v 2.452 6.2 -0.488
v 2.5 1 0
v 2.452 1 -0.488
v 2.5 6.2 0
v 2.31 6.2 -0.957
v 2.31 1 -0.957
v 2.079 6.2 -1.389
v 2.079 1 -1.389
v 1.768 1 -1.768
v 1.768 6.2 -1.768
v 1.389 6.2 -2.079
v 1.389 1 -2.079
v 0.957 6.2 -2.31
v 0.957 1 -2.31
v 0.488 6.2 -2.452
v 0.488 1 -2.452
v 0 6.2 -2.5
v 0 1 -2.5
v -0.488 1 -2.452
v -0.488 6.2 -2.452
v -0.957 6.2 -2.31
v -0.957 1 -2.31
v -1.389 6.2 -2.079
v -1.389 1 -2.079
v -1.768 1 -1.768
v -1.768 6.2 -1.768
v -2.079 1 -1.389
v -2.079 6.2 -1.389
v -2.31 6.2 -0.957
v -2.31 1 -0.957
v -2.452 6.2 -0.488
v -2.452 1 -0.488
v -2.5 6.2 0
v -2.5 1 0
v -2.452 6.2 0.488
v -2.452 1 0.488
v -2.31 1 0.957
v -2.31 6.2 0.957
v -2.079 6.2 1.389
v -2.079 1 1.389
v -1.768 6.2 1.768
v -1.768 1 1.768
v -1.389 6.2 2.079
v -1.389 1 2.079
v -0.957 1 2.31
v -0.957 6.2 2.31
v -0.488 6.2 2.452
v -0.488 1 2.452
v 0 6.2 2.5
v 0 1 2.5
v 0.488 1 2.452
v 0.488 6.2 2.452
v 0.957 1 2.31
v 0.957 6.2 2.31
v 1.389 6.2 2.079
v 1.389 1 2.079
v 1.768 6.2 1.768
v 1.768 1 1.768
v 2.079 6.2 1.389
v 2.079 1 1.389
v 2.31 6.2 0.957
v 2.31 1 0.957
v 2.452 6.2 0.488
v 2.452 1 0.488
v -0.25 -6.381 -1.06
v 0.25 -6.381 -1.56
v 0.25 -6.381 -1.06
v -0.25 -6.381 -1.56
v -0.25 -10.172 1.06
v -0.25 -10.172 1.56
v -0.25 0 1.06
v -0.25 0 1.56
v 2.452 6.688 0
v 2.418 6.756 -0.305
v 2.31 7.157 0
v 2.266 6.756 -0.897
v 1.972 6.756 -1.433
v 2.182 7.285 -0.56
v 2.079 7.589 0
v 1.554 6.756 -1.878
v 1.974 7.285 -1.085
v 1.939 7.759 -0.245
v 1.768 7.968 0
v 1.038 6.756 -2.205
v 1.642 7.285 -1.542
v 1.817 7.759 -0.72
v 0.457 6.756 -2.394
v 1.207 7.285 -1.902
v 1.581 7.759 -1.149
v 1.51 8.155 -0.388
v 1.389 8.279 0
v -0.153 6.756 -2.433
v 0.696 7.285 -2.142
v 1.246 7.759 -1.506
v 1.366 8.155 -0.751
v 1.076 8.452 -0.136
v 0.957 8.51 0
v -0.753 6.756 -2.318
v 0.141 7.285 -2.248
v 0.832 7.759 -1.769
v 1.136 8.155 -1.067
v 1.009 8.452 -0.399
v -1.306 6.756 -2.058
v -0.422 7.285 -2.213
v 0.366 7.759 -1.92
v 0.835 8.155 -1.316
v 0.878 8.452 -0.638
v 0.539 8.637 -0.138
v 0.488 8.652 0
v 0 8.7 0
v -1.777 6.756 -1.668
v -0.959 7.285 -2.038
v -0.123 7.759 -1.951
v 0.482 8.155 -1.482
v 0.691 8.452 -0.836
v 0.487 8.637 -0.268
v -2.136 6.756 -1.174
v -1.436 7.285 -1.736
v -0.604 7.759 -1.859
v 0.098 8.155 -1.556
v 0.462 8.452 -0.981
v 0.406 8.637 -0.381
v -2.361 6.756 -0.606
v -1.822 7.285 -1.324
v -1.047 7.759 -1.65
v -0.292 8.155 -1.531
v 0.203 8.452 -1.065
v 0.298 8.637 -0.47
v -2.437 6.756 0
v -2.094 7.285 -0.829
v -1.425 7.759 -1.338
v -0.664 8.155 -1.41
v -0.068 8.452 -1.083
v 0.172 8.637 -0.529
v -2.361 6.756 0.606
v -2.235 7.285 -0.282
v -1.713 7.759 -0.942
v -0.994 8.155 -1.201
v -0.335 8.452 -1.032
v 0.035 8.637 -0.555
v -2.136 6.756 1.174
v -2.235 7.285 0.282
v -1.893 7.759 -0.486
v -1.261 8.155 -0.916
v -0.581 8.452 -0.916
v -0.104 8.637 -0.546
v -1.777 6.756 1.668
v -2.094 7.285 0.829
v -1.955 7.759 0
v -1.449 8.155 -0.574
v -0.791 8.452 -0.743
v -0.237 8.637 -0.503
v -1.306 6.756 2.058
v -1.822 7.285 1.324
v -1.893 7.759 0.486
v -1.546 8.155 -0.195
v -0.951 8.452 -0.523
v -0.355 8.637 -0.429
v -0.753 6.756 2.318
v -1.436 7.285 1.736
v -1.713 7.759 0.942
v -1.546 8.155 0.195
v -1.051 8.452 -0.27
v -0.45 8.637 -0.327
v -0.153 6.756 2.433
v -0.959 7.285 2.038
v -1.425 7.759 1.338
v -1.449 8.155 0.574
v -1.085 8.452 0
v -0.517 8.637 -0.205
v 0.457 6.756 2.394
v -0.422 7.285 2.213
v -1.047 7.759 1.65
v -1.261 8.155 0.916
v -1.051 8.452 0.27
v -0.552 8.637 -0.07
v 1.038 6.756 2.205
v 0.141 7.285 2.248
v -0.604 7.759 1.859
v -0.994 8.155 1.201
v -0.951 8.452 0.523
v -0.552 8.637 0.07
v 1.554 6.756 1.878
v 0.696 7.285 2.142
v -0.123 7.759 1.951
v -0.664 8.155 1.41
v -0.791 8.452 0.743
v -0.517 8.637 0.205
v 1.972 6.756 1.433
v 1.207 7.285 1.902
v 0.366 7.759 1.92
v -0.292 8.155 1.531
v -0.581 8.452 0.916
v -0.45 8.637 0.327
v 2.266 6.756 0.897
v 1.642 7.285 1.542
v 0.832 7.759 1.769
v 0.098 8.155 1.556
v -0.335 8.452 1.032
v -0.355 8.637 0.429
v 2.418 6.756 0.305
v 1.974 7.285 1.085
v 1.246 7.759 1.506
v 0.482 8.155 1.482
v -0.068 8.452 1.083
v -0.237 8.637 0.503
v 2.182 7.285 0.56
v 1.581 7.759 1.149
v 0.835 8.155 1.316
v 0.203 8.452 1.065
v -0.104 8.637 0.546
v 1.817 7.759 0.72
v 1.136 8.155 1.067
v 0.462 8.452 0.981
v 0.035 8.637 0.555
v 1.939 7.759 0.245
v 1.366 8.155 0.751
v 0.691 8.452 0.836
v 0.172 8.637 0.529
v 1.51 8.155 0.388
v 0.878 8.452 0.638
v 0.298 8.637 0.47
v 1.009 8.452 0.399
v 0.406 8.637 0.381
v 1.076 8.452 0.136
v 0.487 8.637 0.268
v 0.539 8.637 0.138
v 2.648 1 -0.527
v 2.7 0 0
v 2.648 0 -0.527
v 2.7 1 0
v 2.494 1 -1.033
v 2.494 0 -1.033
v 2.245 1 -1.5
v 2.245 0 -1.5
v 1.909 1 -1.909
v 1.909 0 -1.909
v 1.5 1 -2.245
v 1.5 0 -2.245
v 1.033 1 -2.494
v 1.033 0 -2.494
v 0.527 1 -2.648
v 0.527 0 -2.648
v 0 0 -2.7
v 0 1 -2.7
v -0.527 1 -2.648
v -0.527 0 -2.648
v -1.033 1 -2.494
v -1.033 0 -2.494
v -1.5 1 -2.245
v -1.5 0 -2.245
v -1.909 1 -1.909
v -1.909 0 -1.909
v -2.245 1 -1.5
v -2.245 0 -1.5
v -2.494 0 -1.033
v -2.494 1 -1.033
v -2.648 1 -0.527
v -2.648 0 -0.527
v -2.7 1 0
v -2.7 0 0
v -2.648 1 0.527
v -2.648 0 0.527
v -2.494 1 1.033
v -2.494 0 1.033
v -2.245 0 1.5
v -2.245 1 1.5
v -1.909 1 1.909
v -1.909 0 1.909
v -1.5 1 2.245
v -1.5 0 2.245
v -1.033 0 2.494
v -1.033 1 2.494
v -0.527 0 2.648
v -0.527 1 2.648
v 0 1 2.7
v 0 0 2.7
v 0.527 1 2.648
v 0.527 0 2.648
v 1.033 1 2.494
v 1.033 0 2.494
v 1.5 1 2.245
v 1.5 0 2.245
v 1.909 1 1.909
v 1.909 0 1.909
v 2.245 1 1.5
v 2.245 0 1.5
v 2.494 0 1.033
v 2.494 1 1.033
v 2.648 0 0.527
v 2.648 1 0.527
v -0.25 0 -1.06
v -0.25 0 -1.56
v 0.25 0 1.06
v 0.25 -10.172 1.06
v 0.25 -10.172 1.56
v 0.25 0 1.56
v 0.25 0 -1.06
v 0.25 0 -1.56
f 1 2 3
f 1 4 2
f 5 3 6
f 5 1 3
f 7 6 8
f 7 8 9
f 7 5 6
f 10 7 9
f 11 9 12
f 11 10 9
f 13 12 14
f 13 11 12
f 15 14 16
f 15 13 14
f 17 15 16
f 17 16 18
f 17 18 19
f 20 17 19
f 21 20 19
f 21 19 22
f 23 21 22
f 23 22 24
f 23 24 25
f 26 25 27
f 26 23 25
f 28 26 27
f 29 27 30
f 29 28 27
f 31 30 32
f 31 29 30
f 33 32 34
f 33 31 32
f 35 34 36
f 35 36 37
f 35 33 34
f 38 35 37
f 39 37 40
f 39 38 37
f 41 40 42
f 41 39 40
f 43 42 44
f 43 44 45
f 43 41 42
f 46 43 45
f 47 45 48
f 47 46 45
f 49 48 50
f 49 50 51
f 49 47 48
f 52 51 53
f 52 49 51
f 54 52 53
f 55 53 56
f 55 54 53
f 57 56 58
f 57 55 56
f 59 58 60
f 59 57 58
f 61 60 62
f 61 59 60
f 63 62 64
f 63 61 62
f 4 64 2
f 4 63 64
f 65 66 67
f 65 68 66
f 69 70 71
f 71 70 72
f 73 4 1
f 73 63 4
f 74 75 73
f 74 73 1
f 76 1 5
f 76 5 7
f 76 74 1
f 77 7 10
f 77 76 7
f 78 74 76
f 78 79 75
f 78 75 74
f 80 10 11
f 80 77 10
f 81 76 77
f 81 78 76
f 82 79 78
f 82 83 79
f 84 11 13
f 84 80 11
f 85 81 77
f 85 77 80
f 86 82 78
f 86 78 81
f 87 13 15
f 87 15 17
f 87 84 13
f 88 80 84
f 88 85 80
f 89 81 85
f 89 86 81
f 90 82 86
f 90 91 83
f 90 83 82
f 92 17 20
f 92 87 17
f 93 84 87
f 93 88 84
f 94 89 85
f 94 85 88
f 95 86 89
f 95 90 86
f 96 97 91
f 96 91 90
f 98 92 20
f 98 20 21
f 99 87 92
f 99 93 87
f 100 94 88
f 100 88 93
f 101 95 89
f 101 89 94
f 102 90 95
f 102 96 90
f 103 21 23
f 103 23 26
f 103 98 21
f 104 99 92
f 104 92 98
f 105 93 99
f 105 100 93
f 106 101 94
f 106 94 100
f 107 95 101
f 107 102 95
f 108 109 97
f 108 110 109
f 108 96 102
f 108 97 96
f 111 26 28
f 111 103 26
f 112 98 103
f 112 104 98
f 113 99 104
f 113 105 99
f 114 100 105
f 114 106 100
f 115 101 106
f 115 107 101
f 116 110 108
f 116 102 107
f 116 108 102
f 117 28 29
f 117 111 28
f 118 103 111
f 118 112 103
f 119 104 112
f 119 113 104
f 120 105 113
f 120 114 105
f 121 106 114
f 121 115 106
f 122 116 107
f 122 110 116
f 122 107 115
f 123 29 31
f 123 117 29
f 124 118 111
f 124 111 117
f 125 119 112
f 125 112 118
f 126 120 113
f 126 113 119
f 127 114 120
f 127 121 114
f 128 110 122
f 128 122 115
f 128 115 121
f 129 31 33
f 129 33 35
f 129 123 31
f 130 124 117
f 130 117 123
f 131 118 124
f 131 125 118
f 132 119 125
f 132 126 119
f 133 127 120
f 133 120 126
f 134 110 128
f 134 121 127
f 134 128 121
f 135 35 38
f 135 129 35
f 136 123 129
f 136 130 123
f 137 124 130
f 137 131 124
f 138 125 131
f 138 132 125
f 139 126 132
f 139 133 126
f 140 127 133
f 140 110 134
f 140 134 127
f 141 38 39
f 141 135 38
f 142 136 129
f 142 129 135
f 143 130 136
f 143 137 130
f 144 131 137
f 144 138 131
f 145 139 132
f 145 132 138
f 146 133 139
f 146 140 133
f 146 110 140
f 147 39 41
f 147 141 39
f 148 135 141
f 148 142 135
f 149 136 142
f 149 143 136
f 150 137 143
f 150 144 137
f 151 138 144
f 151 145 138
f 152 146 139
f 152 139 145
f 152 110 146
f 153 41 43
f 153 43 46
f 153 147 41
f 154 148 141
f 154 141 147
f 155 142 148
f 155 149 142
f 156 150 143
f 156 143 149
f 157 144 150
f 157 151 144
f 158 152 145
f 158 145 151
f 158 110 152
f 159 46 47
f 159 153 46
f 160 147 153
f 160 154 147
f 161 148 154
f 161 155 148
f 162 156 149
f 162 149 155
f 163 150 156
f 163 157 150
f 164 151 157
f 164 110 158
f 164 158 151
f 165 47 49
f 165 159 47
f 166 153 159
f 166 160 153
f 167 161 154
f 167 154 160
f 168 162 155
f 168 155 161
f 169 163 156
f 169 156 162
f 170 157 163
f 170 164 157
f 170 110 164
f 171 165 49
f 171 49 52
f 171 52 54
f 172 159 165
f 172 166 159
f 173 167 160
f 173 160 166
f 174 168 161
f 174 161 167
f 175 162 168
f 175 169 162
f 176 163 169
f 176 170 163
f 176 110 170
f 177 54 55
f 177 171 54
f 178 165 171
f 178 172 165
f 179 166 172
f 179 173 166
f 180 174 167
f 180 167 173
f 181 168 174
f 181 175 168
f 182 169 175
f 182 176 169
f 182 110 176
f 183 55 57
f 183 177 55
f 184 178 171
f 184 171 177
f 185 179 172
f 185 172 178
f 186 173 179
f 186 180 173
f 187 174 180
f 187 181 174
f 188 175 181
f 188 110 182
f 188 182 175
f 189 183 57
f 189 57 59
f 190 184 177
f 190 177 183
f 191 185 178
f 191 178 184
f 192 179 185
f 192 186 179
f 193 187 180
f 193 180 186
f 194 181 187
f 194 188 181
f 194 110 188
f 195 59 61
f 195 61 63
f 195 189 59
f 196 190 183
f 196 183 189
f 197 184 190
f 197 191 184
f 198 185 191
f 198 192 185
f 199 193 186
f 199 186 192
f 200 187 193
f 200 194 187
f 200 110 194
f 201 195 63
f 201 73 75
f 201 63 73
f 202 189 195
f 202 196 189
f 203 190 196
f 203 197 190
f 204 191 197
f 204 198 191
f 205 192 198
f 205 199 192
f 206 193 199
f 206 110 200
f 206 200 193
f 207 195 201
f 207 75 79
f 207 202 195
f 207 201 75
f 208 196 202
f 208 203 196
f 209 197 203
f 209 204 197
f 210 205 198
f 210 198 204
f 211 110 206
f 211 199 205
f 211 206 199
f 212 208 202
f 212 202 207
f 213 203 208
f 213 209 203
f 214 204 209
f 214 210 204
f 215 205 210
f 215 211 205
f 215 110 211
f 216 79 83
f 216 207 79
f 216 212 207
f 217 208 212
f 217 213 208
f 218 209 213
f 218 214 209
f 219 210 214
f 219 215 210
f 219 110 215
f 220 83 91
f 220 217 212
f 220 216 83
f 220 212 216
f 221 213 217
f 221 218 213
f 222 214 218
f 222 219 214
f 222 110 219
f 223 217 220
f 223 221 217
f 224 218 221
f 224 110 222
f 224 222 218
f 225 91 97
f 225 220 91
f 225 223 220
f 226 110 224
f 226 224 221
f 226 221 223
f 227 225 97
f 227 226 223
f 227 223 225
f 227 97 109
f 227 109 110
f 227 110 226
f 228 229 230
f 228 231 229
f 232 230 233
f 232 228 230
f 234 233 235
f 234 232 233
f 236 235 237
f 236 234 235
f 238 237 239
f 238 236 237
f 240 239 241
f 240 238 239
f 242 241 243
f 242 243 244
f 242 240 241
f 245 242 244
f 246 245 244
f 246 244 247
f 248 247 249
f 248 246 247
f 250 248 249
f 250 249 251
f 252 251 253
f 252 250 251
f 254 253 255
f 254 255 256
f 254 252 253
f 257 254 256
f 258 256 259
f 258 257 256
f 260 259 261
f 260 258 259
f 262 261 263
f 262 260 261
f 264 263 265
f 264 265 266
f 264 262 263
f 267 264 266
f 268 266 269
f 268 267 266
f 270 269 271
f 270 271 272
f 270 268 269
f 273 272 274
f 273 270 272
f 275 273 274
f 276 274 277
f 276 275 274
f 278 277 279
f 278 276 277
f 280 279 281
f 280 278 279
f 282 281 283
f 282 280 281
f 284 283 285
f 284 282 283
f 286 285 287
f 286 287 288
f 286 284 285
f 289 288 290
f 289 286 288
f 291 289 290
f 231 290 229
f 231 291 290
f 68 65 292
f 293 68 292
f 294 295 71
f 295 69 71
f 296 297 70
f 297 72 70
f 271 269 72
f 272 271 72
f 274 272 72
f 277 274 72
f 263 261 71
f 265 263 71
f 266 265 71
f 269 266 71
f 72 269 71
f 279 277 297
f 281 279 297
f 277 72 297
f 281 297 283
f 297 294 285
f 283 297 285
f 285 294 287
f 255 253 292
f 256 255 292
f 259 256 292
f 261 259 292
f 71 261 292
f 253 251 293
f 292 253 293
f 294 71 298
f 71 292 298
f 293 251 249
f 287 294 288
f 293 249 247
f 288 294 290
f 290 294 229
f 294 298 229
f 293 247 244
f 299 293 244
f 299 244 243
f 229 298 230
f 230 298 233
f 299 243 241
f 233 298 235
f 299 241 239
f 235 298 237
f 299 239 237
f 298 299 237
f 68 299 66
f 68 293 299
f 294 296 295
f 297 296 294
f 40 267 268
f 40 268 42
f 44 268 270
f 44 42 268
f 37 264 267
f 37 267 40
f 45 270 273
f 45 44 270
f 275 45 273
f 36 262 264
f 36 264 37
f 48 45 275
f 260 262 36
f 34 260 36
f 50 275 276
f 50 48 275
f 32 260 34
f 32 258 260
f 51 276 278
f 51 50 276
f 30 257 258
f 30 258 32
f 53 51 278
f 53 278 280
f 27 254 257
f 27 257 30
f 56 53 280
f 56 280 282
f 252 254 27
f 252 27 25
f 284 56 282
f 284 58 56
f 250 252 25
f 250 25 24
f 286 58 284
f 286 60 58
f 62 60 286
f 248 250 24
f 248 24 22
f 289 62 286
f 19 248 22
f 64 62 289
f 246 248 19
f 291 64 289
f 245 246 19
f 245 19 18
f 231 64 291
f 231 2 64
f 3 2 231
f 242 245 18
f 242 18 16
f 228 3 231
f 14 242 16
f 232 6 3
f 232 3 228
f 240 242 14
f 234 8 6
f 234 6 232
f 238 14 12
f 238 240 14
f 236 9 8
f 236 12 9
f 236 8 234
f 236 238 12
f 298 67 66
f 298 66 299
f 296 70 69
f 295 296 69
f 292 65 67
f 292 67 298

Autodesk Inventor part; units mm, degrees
ref_plane "YZ Plane" through (0, 0, 0) normal (1, 0, 0) x (0, 1, 0)
ref_plane "XZ Plane" through (0, 0, 0) normal (0, 1, 0) x (-1, 0, 0)
ref_plane "XY Plane" through (0, 0, 0) normal (0, 0, 1) x (1, 0, 0)
sketch "스케치1" plane through (0, 0, 0) normal (0, 0, 1) x (1, 0, 0)
  line L0 (0, 0) -> (2.5, 0)
  line L1 (0, 0) -> (0, 8.7)
  line L2 (2.5, 0) -> (2.7, 0)
  line L3 (2.7, 0) -> (2.7, 1)
  line L4 (2.7, 1) -> (2.5, 1)
  line L5 (2.5, 1) -> (2.5, 6.2)
  line L6 (2.5, 8.7) -> (0, 8.7)
  arc A0 (2.5, 6.2) -> (0, 8.7) centre (0, 6.2) ccw
  dimension "d0" = 2.5
  dimension "d1" = 8.7
  dimension "d2" = 0.2
  dimension "d3" = 1
  dimension "d4" = 2.5
revolve "회전1" add sketch "스케치1" angle 360 about axis through (0, 0, 0) along (0, 1, 0)
sketch "스케치2" plane through (0, 0, 0) normal (1, 0, 0) x (0, 1, 0)
  line L0 (0, 2.7) -> (0, -2.7) projected
  line L1 (0, -1.56) -> (-6.3813, -1.56)
  line L2 (-6.3813, -1.56) -> (-6.3813, -1.06)
  line L3 (-6.3813, -1.06) -> (0, -1.06)
  line L4 (0, -1.06) -> (0, -1.56)
  line L5 (0, 1.56) -> (-10.1722, 1.56)
  line L6 (-10.1722, 1.56) -> (-10.1722, 1.06)
  line L7 (-10.1722, 1.06) -> (0, 1.06)
  line L8 (0, 1.06) -> (0, 1.56)
  point P0 (0, 0)
  point P1 (0, 1.06)
  dimension "d7" = 1.14
  dimension "d8" = 1.14
  dimension "d9" = 0.5
  dimension "d10" = 0.5
extrude "돌출1" add sketch "스케치2" along normal mid plane 0.5
properties part number "LED"
